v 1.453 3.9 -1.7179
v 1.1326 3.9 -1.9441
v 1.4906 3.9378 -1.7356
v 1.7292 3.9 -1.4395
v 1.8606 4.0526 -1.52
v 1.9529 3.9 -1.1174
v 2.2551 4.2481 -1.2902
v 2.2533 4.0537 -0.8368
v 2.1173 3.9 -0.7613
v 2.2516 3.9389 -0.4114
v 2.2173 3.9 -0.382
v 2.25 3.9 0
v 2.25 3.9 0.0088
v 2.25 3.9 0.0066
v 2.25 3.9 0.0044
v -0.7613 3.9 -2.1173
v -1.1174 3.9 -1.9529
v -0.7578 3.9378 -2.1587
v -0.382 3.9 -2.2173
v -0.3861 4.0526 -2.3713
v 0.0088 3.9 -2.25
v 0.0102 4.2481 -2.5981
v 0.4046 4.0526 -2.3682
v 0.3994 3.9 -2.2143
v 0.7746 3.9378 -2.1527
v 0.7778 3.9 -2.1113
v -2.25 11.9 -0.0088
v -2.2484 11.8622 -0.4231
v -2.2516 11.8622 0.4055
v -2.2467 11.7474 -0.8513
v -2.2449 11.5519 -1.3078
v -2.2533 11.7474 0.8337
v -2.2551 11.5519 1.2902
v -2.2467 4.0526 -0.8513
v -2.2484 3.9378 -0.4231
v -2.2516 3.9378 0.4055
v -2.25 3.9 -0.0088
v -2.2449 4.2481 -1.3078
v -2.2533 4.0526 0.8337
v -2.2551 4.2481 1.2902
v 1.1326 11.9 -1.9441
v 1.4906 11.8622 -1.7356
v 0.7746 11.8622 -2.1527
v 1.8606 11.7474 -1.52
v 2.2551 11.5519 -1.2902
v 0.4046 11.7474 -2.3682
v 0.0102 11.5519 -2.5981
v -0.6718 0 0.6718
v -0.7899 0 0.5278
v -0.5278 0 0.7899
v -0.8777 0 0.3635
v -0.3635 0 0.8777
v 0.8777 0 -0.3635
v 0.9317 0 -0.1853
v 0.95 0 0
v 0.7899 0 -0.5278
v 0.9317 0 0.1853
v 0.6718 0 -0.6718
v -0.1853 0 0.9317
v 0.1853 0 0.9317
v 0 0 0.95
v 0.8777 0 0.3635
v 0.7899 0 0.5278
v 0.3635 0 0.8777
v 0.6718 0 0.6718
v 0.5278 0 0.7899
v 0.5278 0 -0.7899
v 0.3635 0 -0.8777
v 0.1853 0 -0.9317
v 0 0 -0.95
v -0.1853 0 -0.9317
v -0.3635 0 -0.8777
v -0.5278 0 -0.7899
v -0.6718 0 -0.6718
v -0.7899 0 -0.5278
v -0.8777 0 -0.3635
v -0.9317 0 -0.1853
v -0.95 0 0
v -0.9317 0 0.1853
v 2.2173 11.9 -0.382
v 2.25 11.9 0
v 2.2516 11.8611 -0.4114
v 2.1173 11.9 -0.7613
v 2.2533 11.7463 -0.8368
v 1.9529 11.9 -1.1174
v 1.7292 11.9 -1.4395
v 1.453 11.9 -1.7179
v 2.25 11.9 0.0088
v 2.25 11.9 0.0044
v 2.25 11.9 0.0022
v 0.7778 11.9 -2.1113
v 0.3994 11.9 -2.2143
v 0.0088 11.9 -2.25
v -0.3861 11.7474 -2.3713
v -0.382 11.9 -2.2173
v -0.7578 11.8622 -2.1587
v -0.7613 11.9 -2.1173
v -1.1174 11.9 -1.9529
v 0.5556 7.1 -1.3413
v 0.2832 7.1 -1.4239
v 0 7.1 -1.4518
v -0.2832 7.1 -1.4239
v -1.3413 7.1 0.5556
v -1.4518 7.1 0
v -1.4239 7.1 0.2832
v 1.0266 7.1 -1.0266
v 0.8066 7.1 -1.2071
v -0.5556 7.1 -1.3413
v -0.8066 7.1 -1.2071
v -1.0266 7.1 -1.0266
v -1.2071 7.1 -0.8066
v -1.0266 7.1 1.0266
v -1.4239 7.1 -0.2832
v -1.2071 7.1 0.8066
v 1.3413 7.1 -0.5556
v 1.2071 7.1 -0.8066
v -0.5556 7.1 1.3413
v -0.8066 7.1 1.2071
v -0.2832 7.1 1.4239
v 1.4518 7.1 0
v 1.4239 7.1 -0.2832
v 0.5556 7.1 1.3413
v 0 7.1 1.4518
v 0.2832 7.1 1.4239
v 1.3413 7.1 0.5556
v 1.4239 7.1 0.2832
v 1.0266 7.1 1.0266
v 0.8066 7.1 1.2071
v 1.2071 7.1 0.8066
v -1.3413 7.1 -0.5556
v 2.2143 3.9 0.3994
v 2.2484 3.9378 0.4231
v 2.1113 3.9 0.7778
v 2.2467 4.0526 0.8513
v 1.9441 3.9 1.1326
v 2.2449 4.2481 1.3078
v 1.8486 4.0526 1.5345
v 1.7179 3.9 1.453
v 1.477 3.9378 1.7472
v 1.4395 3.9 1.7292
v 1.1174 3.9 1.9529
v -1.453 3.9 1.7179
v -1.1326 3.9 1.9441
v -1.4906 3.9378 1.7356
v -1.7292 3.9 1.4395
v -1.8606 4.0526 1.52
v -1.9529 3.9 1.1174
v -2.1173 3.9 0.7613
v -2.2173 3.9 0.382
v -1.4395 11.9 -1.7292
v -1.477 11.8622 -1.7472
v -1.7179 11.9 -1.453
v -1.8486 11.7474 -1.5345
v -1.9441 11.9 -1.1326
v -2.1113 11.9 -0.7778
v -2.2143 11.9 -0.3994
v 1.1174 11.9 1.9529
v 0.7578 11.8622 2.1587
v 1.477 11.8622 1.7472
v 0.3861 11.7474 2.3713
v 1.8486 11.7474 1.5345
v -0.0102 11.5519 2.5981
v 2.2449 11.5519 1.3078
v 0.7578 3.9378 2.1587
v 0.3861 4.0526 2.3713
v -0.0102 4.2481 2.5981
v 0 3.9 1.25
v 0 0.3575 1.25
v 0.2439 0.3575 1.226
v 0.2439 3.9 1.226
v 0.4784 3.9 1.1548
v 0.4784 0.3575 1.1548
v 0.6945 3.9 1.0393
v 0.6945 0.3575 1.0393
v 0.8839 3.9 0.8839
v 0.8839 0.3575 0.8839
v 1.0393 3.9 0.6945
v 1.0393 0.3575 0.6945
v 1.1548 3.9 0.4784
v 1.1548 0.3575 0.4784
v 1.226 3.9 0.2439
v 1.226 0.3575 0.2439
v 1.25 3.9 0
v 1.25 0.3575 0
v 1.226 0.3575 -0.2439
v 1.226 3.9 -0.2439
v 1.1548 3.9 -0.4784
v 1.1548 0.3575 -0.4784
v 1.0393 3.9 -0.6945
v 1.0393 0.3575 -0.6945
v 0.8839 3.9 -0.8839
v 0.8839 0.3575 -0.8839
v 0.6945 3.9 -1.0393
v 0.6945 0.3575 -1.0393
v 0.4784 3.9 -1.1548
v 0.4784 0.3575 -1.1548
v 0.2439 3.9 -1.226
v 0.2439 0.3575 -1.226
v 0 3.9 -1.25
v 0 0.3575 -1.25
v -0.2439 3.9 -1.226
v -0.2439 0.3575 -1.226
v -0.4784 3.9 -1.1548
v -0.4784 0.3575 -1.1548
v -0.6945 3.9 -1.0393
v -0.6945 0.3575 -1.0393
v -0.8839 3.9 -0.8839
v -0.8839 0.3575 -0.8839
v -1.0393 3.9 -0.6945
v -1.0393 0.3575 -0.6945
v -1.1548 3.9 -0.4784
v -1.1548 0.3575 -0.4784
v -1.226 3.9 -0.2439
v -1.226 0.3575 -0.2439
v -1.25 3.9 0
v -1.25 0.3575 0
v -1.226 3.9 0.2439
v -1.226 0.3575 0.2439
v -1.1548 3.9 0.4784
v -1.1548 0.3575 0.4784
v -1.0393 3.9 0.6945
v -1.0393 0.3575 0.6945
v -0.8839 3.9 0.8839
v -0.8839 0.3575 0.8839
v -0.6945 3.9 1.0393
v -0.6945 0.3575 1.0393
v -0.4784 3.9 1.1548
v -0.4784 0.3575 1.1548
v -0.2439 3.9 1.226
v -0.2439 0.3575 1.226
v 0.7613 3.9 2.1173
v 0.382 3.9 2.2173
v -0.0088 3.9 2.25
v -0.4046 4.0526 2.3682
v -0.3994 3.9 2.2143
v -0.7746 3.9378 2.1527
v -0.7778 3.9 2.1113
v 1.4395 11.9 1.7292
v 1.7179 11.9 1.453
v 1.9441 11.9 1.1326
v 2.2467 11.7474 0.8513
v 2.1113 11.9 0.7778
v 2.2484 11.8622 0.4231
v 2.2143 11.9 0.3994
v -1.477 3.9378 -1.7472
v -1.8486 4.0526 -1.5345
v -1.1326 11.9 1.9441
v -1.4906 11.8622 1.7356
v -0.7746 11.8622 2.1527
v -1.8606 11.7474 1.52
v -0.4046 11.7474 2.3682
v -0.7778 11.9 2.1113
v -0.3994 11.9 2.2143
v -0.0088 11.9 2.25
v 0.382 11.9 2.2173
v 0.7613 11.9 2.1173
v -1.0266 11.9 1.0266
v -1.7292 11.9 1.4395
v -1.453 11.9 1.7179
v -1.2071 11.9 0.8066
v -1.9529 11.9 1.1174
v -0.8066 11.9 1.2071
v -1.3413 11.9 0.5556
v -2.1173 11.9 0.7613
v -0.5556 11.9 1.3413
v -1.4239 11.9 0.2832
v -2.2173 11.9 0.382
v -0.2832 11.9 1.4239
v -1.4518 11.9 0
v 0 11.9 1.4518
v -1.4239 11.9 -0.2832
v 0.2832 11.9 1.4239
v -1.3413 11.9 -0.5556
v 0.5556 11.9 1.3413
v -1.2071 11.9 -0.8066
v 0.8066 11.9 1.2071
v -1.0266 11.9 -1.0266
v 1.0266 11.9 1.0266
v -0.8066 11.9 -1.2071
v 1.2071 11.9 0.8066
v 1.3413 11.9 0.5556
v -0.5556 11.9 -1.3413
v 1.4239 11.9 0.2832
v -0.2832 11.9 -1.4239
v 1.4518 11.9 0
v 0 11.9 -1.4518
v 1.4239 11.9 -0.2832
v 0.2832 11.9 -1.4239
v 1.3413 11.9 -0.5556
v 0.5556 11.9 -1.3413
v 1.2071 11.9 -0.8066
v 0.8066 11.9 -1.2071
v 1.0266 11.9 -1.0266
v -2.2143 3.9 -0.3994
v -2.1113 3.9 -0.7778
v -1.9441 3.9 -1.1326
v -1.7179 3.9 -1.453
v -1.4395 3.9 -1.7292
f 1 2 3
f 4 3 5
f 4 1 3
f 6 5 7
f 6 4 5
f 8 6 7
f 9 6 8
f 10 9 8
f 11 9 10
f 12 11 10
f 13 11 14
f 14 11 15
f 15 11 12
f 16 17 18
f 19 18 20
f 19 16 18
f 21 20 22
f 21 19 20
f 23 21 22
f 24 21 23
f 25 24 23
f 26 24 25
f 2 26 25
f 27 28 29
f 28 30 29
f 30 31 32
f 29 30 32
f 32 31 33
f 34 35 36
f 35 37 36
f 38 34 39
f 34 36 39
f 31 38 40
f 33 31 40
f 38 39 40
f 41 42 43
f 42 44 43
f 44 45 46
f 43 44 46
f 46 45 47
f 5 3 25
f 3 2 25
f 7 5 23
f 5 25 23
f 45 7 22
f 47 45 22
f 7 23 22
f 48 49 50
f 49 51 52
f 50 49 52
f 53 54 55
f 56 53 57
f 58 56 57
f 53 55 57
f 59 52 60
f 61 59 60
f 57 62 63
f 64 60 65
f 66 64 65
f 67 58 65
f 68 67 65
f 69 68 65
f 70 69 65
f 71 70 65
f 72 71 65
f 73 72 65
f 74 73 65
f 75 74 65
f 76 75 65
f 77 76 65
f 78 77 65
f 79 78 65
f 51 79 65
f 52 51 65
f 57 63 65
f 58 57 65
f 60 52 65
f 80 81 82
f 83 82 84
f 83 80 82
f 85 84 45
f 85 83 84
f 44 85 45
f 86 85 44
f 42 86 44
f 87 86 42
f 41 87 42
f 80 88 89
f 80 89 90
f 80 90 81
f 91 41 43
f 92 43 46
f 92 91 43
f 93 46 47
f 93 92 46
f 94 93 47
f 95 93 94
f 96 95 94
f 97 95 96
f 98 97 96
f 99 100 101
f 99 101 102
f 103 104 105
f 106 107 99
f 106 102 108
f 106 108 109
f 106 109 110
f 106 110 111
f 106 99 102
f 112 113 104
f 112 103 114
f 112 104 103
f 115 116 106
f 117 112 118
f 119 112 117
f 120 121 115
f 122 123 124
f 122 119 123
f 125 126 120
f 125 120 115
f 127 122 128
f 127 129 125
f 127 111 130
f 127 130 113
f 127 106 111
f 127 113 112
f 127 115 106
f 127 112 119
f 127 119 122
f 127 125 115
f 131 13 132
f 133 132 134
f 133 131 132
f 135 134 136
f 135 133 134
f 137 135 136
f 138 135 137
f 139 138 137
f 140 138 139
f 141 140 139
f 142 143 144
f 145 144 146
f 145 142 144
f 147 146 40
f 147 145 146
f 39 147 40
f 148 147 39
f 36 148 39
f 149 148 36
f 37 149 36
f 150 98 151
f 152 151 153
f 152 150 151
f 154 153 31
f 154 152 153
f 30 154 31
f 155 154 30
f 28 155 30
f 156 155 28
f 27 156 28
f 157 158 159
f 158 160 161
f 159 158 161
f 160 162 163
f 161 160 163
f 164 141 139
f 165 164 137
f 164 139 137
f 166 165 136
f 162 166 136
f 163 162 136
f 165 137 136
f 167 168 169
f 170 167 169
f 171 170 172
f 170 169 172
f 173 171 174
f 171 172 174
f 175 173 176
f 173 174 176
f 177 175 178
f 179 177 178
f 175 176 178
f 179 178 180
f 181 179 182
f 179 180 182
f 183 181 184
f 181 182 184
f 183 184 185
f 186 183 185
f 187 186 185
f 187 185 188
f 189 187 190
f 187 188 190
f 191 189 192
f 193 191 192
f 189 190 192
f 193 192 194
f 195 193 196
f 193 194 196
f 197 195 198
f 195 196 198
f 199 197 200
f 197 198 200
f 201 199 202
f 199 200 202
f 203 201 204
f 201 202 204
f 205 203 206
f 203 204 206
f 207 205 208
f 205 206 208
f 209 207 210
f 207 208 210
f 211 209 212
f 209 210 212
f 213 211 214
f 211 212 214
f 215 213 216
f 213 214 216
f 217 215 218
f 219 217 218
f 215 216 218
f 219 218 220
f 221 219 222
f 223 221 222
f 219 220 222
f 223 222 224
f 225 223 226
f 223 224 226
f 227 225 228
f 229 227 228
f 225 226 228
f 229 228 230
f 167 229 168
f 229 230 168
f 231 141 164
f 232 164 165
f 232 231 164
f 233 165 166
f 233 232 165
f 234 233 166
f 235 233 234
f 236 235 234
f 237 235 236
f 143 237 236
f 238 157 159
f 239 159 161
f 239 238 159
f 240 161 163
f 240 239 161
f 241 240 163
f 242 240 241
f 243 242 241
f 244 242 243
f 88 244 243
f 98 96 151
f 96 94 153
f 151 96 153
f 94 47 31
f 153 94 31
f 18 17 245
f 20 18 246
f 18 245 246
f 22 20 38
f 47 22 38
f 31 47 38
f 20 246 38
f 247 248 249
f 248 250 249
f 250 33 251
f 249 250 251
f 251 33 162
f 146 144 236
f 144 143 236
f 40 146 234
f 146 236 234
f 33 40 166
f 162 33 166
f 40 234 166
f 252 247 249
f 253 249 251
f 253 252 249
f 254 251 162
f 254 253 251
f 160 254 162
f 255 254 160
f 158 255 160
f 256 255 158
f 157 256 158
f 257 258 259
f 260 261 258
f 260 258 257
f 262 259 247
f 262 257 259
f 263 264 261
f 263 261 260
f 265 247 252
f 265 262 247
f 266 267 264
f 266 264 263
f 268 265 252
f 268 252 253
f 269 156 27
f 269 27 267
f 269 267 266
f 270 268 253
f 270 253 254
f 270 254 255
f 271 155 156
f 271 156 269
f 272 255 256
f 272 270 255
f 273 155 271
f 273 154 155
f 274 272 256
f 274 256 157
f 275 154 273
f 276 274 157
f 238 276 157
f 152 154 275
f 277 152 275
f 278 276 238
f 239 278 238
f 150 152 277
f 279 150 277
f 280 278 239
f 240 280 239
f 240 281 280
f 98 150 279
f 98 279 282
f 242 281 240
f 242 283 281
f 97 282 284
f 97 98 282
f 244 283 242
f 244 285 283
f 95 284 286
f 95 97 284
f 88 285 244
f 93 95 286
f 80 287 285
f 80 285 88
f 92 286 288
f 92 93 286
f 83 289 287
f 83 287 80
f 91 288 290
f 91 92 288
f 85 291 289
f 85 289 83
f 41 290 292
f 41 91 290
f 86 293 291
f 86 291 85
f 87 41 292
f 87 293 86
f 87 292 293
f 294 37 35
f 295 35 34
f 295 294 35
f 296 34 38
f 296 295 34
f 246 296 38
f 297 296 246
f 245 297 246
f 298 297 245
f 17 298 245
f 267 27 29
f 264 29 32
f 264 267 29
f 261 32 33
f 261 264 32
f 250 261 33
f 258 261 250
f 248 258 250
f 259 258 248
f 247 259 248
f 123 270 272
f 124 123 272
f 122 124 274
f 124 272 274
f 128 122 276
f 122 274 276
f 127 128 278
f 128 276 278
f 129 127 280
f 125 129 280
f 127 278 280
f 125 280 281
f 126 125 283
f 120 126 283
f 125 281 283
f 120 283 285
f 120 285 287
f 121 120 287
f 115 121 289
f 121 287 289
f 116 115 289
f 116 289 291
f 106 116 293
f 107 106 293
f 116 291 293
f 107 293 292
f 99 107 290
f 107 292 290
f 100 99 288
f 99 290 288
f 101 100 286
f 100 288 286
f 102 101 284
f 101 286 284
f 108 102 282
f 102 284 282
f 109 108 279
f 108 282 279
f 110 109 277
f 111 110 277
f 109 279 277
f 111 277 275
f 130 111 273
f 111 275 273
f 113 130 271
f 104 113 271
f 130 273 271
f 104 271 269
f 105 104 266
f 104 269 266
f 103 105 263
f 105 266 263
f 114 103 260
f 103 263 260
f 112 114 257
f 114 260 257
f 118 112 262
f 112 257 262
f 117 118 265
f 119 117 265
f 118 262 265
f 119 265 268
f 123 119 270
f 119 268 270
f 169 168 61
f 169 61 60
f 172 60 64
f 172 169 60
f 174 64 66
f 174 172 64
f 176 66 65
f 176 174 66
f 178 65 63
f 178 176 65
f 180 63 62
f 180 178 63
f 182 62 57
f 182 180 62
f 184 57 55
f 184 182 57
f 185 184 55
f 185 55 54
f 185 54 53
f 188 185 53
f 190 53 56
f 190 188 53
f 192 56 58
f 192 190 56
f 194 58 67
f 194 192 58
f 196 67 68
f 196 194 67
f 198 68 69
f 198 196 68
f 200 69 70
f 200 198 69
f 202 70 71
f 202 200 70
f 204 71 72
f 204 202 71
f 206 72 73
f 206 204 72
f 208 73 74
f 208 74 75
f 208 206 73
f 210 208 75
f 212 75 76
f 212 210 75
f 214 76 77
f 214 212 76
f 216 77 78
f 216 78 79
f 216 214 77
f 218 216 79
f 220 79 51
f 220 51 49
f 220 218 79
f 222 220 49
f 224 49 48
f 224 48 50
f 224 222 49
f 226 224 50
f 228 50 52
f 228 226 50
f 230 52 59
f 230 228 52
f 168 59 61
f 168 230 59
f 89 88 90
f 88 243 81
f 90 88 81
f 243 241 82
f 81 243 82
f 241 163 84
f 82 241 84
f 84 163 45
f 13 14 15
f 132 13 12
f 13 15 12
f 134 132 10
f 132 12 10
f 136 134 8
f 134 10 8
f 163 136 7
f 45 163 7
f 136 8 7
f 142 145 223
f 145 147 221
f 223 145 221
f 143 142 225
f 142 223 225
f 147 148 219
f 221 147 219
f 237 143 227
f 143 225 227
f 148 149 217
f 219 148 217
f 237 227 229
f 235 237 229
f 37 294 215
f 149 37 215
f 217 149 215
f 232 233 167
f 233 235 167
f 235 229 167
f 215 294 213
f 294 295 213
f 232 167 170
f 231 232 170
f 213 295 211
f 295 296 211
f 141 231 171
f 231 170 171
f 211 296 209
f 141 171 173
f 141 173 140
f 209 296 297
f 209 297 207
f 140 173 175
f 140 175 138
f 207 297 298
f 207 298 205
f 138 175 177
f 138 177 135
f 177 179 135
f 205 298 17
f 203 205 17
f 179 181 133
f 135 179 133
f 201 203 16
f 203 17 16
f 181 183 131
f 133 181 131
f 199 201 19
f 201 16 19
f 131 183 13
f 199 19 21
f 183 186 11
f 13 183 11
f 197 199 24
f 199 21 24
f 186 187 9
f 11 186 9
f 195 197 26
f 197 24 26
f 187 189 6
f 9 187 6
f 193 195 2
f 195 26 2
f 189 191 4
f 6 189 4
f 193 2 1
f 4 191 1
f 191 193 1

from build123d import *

# Parameters (mm, degrees)
SKETCH1_R           = 1.25
BOSS_EXTRUDE1_DEPTH = 3.9
BOSS_EXTRUDE2_DEPTH = 8
SKETCH3_R           = 1.45181539
CUT_EXTRUDE1_DEPTH  = 4.8
SKETCH4_OUTSIDE_W   = 36.034
SKETCH4_OUTSIDE_H   = 36.72
SKETCH4_OUTSIDE_R   = 2.25
CUT_EXTRUDE2_DEPTH  = 13.387300307
CUT_EXTRUDE2_DRAFT  = -45
SKETCH5_OUTSIDE_W   = 28.676
SKETCH5_OUTSIDE_H   = 29.362
SKETCH5_OUTSIDE_R   = 2.25
CUT_EXTRUDE3_DEPTH  = 9.708341341
CUT_EXTRUDE3_DRAFT  = -45
CHAMFER1_SIZE       = 0.3
CHAMFER1_SIZE2      = 0.357526078


with BuildPart() as part:
    # Sketch1 → Boss-Extrude1 (new body)
    with BuildSketch(Plane(origin=(0, 0, 0), x_dir=(1, 0, 0), z_dir=(0, 1, 0))):
        with Locations(Location((0, 0, 0), (0, 0, 270))):
            Circle(SKETCH1_R)
    extrude(amount=BOSS_EXTRUDE1_DEPTH)

    # Sketch2 → Boss-Extrude2 (add)
    with BuildSketch(Plane(origin=(0, 3.9, 0), x_dir=(1, 0, 0), z_dir=(0, 1, 0))):
        Polygon((2.244901907, -1.307828516), (2.255063672, 1.290227823), (0.010161765, 2.598056339), (-2.244901907, 1.307828516), (-2.255063672, -1.290227823), (-0.010161765, -2.598056339), align=None)
    extrude(amount=BOSS_EXTRUDE2_DEPTH)

    # Sketch3 → Cut-Extrude1 (cut)
    with BuildSketch(Plane(origin=(0, 11.9, 0), x_dir=(1, 0, 0), z_dir=(0, 1, 0))):
        with Locations(Location((0, 0, 0), (0, 0, 270))):
            Circle(SKETCH3_R)
    extrude(amount=-CUT_EXTRUDE1_DEPTH, mode=Mode.SUBTRACT)


with BuildPart() as cut_extrude2_tool:
    # Sketch4 outside → Cut-Extrude2 (with draft: the straight prism first)
    with BuildSketch(Plane(origin=(0, 11.9, 0), x_dir=(1, 0, 0), z_dir=(0, 1, 0))):
        Rectangle(SKETCH4_OUTSIDE_W, SKETCH4_OUTSIDE_H)
        Circle(SKETCH4_OUTSIDE_R, mode=Mode.SUBTRACT)
    extrude(amount=-CUT_EXTRUDE2_DEPTH)
    # Cut-Extrude2: the draft: its side faces are tilted about the plane it starts from
    cut_extrude2_sides = [cut_extrude2_tool.faces().sort_by_distance(p)[0] for p in [
        (0, 5.206349846, 18.36),
        (18.017, 5.206349846, 0),
        (0, 5.206349846, -18.36),
        (-18.017, 5.206349846, 0),
        (-2.25, 5.206349846, 0),
    ]]
    draft(cut_extrude2_sides, Plane(origin=(0, 11.9, 0), x_dir=(1, 0, 0), z_dir=(0, 1, 0)), CUT_EXTRUDE2_DRAFT)


with BuildPart() as part_1:
    add(part.part)

    # Cut-Extrude2: cut by cut_extrude2_tool
    add(cut_extrude2_tool.part, mode=Mode.SUBTRACT)


with BuildPart() as cut_extrude3_tool:
    # Sketch5 outside → Cut-Extrude3 (with draft: the straight prism first)
    with BuildSketch(Plane.XZ.offset(-3.9)):
        Rectangle(SKETCH5_OUTSIDE_W, SKETCH5_OUTSIDE_H)
        Circle(SKETCH5_OUTSIDE_R, mode=Mode.SUBTRACT)
    extrude(amount=-CUT_EXTRUDE3_DEPTH)
    # Cut-Extrude3: the draft: its side faces are tilted about the plane it starts from
    cut_extrude3_sides = [cut_extrude3_tool.faces().sort_by_distance(p)[0] for p in [
        (0, 8.75417067, -14.681),
        (14.338, 8.75417067, 0),
        (0, 8.75417067, 14.681),
        (-14.338, 8.75417067, 0),
        (-2.25, 8.75417067, 0),
    ]]
    draft(cut_extrude3_sides, Plane.XZ.offset(-3.9), CUT_EXTRUDE3_DRAFT)


with BuildPart() as part_2:
    add(part_1.part)

    # Cut-Extrude3: cut by cut_extrude3_tool
    add(cut_extrude3_tool.part, mode=Mode.SUBTRACT)

    # Chamfer1
    chamfer1_edges = [part_2.edges().sort_by_distance(p)[0] for p in [
        (0, 0, -1.25),
    ]]
    chamfer1_side = [part_2.faces().sort_by_distance(p)[0] for p in [
        (0, 0, 0),
    ]]
    chamfer(chamfer1_edges, length=CHAMFER1_SIZE, length2=CHAMFER1_SIZE2, reference=chamfer1_side[0])


solid = part_2.part
